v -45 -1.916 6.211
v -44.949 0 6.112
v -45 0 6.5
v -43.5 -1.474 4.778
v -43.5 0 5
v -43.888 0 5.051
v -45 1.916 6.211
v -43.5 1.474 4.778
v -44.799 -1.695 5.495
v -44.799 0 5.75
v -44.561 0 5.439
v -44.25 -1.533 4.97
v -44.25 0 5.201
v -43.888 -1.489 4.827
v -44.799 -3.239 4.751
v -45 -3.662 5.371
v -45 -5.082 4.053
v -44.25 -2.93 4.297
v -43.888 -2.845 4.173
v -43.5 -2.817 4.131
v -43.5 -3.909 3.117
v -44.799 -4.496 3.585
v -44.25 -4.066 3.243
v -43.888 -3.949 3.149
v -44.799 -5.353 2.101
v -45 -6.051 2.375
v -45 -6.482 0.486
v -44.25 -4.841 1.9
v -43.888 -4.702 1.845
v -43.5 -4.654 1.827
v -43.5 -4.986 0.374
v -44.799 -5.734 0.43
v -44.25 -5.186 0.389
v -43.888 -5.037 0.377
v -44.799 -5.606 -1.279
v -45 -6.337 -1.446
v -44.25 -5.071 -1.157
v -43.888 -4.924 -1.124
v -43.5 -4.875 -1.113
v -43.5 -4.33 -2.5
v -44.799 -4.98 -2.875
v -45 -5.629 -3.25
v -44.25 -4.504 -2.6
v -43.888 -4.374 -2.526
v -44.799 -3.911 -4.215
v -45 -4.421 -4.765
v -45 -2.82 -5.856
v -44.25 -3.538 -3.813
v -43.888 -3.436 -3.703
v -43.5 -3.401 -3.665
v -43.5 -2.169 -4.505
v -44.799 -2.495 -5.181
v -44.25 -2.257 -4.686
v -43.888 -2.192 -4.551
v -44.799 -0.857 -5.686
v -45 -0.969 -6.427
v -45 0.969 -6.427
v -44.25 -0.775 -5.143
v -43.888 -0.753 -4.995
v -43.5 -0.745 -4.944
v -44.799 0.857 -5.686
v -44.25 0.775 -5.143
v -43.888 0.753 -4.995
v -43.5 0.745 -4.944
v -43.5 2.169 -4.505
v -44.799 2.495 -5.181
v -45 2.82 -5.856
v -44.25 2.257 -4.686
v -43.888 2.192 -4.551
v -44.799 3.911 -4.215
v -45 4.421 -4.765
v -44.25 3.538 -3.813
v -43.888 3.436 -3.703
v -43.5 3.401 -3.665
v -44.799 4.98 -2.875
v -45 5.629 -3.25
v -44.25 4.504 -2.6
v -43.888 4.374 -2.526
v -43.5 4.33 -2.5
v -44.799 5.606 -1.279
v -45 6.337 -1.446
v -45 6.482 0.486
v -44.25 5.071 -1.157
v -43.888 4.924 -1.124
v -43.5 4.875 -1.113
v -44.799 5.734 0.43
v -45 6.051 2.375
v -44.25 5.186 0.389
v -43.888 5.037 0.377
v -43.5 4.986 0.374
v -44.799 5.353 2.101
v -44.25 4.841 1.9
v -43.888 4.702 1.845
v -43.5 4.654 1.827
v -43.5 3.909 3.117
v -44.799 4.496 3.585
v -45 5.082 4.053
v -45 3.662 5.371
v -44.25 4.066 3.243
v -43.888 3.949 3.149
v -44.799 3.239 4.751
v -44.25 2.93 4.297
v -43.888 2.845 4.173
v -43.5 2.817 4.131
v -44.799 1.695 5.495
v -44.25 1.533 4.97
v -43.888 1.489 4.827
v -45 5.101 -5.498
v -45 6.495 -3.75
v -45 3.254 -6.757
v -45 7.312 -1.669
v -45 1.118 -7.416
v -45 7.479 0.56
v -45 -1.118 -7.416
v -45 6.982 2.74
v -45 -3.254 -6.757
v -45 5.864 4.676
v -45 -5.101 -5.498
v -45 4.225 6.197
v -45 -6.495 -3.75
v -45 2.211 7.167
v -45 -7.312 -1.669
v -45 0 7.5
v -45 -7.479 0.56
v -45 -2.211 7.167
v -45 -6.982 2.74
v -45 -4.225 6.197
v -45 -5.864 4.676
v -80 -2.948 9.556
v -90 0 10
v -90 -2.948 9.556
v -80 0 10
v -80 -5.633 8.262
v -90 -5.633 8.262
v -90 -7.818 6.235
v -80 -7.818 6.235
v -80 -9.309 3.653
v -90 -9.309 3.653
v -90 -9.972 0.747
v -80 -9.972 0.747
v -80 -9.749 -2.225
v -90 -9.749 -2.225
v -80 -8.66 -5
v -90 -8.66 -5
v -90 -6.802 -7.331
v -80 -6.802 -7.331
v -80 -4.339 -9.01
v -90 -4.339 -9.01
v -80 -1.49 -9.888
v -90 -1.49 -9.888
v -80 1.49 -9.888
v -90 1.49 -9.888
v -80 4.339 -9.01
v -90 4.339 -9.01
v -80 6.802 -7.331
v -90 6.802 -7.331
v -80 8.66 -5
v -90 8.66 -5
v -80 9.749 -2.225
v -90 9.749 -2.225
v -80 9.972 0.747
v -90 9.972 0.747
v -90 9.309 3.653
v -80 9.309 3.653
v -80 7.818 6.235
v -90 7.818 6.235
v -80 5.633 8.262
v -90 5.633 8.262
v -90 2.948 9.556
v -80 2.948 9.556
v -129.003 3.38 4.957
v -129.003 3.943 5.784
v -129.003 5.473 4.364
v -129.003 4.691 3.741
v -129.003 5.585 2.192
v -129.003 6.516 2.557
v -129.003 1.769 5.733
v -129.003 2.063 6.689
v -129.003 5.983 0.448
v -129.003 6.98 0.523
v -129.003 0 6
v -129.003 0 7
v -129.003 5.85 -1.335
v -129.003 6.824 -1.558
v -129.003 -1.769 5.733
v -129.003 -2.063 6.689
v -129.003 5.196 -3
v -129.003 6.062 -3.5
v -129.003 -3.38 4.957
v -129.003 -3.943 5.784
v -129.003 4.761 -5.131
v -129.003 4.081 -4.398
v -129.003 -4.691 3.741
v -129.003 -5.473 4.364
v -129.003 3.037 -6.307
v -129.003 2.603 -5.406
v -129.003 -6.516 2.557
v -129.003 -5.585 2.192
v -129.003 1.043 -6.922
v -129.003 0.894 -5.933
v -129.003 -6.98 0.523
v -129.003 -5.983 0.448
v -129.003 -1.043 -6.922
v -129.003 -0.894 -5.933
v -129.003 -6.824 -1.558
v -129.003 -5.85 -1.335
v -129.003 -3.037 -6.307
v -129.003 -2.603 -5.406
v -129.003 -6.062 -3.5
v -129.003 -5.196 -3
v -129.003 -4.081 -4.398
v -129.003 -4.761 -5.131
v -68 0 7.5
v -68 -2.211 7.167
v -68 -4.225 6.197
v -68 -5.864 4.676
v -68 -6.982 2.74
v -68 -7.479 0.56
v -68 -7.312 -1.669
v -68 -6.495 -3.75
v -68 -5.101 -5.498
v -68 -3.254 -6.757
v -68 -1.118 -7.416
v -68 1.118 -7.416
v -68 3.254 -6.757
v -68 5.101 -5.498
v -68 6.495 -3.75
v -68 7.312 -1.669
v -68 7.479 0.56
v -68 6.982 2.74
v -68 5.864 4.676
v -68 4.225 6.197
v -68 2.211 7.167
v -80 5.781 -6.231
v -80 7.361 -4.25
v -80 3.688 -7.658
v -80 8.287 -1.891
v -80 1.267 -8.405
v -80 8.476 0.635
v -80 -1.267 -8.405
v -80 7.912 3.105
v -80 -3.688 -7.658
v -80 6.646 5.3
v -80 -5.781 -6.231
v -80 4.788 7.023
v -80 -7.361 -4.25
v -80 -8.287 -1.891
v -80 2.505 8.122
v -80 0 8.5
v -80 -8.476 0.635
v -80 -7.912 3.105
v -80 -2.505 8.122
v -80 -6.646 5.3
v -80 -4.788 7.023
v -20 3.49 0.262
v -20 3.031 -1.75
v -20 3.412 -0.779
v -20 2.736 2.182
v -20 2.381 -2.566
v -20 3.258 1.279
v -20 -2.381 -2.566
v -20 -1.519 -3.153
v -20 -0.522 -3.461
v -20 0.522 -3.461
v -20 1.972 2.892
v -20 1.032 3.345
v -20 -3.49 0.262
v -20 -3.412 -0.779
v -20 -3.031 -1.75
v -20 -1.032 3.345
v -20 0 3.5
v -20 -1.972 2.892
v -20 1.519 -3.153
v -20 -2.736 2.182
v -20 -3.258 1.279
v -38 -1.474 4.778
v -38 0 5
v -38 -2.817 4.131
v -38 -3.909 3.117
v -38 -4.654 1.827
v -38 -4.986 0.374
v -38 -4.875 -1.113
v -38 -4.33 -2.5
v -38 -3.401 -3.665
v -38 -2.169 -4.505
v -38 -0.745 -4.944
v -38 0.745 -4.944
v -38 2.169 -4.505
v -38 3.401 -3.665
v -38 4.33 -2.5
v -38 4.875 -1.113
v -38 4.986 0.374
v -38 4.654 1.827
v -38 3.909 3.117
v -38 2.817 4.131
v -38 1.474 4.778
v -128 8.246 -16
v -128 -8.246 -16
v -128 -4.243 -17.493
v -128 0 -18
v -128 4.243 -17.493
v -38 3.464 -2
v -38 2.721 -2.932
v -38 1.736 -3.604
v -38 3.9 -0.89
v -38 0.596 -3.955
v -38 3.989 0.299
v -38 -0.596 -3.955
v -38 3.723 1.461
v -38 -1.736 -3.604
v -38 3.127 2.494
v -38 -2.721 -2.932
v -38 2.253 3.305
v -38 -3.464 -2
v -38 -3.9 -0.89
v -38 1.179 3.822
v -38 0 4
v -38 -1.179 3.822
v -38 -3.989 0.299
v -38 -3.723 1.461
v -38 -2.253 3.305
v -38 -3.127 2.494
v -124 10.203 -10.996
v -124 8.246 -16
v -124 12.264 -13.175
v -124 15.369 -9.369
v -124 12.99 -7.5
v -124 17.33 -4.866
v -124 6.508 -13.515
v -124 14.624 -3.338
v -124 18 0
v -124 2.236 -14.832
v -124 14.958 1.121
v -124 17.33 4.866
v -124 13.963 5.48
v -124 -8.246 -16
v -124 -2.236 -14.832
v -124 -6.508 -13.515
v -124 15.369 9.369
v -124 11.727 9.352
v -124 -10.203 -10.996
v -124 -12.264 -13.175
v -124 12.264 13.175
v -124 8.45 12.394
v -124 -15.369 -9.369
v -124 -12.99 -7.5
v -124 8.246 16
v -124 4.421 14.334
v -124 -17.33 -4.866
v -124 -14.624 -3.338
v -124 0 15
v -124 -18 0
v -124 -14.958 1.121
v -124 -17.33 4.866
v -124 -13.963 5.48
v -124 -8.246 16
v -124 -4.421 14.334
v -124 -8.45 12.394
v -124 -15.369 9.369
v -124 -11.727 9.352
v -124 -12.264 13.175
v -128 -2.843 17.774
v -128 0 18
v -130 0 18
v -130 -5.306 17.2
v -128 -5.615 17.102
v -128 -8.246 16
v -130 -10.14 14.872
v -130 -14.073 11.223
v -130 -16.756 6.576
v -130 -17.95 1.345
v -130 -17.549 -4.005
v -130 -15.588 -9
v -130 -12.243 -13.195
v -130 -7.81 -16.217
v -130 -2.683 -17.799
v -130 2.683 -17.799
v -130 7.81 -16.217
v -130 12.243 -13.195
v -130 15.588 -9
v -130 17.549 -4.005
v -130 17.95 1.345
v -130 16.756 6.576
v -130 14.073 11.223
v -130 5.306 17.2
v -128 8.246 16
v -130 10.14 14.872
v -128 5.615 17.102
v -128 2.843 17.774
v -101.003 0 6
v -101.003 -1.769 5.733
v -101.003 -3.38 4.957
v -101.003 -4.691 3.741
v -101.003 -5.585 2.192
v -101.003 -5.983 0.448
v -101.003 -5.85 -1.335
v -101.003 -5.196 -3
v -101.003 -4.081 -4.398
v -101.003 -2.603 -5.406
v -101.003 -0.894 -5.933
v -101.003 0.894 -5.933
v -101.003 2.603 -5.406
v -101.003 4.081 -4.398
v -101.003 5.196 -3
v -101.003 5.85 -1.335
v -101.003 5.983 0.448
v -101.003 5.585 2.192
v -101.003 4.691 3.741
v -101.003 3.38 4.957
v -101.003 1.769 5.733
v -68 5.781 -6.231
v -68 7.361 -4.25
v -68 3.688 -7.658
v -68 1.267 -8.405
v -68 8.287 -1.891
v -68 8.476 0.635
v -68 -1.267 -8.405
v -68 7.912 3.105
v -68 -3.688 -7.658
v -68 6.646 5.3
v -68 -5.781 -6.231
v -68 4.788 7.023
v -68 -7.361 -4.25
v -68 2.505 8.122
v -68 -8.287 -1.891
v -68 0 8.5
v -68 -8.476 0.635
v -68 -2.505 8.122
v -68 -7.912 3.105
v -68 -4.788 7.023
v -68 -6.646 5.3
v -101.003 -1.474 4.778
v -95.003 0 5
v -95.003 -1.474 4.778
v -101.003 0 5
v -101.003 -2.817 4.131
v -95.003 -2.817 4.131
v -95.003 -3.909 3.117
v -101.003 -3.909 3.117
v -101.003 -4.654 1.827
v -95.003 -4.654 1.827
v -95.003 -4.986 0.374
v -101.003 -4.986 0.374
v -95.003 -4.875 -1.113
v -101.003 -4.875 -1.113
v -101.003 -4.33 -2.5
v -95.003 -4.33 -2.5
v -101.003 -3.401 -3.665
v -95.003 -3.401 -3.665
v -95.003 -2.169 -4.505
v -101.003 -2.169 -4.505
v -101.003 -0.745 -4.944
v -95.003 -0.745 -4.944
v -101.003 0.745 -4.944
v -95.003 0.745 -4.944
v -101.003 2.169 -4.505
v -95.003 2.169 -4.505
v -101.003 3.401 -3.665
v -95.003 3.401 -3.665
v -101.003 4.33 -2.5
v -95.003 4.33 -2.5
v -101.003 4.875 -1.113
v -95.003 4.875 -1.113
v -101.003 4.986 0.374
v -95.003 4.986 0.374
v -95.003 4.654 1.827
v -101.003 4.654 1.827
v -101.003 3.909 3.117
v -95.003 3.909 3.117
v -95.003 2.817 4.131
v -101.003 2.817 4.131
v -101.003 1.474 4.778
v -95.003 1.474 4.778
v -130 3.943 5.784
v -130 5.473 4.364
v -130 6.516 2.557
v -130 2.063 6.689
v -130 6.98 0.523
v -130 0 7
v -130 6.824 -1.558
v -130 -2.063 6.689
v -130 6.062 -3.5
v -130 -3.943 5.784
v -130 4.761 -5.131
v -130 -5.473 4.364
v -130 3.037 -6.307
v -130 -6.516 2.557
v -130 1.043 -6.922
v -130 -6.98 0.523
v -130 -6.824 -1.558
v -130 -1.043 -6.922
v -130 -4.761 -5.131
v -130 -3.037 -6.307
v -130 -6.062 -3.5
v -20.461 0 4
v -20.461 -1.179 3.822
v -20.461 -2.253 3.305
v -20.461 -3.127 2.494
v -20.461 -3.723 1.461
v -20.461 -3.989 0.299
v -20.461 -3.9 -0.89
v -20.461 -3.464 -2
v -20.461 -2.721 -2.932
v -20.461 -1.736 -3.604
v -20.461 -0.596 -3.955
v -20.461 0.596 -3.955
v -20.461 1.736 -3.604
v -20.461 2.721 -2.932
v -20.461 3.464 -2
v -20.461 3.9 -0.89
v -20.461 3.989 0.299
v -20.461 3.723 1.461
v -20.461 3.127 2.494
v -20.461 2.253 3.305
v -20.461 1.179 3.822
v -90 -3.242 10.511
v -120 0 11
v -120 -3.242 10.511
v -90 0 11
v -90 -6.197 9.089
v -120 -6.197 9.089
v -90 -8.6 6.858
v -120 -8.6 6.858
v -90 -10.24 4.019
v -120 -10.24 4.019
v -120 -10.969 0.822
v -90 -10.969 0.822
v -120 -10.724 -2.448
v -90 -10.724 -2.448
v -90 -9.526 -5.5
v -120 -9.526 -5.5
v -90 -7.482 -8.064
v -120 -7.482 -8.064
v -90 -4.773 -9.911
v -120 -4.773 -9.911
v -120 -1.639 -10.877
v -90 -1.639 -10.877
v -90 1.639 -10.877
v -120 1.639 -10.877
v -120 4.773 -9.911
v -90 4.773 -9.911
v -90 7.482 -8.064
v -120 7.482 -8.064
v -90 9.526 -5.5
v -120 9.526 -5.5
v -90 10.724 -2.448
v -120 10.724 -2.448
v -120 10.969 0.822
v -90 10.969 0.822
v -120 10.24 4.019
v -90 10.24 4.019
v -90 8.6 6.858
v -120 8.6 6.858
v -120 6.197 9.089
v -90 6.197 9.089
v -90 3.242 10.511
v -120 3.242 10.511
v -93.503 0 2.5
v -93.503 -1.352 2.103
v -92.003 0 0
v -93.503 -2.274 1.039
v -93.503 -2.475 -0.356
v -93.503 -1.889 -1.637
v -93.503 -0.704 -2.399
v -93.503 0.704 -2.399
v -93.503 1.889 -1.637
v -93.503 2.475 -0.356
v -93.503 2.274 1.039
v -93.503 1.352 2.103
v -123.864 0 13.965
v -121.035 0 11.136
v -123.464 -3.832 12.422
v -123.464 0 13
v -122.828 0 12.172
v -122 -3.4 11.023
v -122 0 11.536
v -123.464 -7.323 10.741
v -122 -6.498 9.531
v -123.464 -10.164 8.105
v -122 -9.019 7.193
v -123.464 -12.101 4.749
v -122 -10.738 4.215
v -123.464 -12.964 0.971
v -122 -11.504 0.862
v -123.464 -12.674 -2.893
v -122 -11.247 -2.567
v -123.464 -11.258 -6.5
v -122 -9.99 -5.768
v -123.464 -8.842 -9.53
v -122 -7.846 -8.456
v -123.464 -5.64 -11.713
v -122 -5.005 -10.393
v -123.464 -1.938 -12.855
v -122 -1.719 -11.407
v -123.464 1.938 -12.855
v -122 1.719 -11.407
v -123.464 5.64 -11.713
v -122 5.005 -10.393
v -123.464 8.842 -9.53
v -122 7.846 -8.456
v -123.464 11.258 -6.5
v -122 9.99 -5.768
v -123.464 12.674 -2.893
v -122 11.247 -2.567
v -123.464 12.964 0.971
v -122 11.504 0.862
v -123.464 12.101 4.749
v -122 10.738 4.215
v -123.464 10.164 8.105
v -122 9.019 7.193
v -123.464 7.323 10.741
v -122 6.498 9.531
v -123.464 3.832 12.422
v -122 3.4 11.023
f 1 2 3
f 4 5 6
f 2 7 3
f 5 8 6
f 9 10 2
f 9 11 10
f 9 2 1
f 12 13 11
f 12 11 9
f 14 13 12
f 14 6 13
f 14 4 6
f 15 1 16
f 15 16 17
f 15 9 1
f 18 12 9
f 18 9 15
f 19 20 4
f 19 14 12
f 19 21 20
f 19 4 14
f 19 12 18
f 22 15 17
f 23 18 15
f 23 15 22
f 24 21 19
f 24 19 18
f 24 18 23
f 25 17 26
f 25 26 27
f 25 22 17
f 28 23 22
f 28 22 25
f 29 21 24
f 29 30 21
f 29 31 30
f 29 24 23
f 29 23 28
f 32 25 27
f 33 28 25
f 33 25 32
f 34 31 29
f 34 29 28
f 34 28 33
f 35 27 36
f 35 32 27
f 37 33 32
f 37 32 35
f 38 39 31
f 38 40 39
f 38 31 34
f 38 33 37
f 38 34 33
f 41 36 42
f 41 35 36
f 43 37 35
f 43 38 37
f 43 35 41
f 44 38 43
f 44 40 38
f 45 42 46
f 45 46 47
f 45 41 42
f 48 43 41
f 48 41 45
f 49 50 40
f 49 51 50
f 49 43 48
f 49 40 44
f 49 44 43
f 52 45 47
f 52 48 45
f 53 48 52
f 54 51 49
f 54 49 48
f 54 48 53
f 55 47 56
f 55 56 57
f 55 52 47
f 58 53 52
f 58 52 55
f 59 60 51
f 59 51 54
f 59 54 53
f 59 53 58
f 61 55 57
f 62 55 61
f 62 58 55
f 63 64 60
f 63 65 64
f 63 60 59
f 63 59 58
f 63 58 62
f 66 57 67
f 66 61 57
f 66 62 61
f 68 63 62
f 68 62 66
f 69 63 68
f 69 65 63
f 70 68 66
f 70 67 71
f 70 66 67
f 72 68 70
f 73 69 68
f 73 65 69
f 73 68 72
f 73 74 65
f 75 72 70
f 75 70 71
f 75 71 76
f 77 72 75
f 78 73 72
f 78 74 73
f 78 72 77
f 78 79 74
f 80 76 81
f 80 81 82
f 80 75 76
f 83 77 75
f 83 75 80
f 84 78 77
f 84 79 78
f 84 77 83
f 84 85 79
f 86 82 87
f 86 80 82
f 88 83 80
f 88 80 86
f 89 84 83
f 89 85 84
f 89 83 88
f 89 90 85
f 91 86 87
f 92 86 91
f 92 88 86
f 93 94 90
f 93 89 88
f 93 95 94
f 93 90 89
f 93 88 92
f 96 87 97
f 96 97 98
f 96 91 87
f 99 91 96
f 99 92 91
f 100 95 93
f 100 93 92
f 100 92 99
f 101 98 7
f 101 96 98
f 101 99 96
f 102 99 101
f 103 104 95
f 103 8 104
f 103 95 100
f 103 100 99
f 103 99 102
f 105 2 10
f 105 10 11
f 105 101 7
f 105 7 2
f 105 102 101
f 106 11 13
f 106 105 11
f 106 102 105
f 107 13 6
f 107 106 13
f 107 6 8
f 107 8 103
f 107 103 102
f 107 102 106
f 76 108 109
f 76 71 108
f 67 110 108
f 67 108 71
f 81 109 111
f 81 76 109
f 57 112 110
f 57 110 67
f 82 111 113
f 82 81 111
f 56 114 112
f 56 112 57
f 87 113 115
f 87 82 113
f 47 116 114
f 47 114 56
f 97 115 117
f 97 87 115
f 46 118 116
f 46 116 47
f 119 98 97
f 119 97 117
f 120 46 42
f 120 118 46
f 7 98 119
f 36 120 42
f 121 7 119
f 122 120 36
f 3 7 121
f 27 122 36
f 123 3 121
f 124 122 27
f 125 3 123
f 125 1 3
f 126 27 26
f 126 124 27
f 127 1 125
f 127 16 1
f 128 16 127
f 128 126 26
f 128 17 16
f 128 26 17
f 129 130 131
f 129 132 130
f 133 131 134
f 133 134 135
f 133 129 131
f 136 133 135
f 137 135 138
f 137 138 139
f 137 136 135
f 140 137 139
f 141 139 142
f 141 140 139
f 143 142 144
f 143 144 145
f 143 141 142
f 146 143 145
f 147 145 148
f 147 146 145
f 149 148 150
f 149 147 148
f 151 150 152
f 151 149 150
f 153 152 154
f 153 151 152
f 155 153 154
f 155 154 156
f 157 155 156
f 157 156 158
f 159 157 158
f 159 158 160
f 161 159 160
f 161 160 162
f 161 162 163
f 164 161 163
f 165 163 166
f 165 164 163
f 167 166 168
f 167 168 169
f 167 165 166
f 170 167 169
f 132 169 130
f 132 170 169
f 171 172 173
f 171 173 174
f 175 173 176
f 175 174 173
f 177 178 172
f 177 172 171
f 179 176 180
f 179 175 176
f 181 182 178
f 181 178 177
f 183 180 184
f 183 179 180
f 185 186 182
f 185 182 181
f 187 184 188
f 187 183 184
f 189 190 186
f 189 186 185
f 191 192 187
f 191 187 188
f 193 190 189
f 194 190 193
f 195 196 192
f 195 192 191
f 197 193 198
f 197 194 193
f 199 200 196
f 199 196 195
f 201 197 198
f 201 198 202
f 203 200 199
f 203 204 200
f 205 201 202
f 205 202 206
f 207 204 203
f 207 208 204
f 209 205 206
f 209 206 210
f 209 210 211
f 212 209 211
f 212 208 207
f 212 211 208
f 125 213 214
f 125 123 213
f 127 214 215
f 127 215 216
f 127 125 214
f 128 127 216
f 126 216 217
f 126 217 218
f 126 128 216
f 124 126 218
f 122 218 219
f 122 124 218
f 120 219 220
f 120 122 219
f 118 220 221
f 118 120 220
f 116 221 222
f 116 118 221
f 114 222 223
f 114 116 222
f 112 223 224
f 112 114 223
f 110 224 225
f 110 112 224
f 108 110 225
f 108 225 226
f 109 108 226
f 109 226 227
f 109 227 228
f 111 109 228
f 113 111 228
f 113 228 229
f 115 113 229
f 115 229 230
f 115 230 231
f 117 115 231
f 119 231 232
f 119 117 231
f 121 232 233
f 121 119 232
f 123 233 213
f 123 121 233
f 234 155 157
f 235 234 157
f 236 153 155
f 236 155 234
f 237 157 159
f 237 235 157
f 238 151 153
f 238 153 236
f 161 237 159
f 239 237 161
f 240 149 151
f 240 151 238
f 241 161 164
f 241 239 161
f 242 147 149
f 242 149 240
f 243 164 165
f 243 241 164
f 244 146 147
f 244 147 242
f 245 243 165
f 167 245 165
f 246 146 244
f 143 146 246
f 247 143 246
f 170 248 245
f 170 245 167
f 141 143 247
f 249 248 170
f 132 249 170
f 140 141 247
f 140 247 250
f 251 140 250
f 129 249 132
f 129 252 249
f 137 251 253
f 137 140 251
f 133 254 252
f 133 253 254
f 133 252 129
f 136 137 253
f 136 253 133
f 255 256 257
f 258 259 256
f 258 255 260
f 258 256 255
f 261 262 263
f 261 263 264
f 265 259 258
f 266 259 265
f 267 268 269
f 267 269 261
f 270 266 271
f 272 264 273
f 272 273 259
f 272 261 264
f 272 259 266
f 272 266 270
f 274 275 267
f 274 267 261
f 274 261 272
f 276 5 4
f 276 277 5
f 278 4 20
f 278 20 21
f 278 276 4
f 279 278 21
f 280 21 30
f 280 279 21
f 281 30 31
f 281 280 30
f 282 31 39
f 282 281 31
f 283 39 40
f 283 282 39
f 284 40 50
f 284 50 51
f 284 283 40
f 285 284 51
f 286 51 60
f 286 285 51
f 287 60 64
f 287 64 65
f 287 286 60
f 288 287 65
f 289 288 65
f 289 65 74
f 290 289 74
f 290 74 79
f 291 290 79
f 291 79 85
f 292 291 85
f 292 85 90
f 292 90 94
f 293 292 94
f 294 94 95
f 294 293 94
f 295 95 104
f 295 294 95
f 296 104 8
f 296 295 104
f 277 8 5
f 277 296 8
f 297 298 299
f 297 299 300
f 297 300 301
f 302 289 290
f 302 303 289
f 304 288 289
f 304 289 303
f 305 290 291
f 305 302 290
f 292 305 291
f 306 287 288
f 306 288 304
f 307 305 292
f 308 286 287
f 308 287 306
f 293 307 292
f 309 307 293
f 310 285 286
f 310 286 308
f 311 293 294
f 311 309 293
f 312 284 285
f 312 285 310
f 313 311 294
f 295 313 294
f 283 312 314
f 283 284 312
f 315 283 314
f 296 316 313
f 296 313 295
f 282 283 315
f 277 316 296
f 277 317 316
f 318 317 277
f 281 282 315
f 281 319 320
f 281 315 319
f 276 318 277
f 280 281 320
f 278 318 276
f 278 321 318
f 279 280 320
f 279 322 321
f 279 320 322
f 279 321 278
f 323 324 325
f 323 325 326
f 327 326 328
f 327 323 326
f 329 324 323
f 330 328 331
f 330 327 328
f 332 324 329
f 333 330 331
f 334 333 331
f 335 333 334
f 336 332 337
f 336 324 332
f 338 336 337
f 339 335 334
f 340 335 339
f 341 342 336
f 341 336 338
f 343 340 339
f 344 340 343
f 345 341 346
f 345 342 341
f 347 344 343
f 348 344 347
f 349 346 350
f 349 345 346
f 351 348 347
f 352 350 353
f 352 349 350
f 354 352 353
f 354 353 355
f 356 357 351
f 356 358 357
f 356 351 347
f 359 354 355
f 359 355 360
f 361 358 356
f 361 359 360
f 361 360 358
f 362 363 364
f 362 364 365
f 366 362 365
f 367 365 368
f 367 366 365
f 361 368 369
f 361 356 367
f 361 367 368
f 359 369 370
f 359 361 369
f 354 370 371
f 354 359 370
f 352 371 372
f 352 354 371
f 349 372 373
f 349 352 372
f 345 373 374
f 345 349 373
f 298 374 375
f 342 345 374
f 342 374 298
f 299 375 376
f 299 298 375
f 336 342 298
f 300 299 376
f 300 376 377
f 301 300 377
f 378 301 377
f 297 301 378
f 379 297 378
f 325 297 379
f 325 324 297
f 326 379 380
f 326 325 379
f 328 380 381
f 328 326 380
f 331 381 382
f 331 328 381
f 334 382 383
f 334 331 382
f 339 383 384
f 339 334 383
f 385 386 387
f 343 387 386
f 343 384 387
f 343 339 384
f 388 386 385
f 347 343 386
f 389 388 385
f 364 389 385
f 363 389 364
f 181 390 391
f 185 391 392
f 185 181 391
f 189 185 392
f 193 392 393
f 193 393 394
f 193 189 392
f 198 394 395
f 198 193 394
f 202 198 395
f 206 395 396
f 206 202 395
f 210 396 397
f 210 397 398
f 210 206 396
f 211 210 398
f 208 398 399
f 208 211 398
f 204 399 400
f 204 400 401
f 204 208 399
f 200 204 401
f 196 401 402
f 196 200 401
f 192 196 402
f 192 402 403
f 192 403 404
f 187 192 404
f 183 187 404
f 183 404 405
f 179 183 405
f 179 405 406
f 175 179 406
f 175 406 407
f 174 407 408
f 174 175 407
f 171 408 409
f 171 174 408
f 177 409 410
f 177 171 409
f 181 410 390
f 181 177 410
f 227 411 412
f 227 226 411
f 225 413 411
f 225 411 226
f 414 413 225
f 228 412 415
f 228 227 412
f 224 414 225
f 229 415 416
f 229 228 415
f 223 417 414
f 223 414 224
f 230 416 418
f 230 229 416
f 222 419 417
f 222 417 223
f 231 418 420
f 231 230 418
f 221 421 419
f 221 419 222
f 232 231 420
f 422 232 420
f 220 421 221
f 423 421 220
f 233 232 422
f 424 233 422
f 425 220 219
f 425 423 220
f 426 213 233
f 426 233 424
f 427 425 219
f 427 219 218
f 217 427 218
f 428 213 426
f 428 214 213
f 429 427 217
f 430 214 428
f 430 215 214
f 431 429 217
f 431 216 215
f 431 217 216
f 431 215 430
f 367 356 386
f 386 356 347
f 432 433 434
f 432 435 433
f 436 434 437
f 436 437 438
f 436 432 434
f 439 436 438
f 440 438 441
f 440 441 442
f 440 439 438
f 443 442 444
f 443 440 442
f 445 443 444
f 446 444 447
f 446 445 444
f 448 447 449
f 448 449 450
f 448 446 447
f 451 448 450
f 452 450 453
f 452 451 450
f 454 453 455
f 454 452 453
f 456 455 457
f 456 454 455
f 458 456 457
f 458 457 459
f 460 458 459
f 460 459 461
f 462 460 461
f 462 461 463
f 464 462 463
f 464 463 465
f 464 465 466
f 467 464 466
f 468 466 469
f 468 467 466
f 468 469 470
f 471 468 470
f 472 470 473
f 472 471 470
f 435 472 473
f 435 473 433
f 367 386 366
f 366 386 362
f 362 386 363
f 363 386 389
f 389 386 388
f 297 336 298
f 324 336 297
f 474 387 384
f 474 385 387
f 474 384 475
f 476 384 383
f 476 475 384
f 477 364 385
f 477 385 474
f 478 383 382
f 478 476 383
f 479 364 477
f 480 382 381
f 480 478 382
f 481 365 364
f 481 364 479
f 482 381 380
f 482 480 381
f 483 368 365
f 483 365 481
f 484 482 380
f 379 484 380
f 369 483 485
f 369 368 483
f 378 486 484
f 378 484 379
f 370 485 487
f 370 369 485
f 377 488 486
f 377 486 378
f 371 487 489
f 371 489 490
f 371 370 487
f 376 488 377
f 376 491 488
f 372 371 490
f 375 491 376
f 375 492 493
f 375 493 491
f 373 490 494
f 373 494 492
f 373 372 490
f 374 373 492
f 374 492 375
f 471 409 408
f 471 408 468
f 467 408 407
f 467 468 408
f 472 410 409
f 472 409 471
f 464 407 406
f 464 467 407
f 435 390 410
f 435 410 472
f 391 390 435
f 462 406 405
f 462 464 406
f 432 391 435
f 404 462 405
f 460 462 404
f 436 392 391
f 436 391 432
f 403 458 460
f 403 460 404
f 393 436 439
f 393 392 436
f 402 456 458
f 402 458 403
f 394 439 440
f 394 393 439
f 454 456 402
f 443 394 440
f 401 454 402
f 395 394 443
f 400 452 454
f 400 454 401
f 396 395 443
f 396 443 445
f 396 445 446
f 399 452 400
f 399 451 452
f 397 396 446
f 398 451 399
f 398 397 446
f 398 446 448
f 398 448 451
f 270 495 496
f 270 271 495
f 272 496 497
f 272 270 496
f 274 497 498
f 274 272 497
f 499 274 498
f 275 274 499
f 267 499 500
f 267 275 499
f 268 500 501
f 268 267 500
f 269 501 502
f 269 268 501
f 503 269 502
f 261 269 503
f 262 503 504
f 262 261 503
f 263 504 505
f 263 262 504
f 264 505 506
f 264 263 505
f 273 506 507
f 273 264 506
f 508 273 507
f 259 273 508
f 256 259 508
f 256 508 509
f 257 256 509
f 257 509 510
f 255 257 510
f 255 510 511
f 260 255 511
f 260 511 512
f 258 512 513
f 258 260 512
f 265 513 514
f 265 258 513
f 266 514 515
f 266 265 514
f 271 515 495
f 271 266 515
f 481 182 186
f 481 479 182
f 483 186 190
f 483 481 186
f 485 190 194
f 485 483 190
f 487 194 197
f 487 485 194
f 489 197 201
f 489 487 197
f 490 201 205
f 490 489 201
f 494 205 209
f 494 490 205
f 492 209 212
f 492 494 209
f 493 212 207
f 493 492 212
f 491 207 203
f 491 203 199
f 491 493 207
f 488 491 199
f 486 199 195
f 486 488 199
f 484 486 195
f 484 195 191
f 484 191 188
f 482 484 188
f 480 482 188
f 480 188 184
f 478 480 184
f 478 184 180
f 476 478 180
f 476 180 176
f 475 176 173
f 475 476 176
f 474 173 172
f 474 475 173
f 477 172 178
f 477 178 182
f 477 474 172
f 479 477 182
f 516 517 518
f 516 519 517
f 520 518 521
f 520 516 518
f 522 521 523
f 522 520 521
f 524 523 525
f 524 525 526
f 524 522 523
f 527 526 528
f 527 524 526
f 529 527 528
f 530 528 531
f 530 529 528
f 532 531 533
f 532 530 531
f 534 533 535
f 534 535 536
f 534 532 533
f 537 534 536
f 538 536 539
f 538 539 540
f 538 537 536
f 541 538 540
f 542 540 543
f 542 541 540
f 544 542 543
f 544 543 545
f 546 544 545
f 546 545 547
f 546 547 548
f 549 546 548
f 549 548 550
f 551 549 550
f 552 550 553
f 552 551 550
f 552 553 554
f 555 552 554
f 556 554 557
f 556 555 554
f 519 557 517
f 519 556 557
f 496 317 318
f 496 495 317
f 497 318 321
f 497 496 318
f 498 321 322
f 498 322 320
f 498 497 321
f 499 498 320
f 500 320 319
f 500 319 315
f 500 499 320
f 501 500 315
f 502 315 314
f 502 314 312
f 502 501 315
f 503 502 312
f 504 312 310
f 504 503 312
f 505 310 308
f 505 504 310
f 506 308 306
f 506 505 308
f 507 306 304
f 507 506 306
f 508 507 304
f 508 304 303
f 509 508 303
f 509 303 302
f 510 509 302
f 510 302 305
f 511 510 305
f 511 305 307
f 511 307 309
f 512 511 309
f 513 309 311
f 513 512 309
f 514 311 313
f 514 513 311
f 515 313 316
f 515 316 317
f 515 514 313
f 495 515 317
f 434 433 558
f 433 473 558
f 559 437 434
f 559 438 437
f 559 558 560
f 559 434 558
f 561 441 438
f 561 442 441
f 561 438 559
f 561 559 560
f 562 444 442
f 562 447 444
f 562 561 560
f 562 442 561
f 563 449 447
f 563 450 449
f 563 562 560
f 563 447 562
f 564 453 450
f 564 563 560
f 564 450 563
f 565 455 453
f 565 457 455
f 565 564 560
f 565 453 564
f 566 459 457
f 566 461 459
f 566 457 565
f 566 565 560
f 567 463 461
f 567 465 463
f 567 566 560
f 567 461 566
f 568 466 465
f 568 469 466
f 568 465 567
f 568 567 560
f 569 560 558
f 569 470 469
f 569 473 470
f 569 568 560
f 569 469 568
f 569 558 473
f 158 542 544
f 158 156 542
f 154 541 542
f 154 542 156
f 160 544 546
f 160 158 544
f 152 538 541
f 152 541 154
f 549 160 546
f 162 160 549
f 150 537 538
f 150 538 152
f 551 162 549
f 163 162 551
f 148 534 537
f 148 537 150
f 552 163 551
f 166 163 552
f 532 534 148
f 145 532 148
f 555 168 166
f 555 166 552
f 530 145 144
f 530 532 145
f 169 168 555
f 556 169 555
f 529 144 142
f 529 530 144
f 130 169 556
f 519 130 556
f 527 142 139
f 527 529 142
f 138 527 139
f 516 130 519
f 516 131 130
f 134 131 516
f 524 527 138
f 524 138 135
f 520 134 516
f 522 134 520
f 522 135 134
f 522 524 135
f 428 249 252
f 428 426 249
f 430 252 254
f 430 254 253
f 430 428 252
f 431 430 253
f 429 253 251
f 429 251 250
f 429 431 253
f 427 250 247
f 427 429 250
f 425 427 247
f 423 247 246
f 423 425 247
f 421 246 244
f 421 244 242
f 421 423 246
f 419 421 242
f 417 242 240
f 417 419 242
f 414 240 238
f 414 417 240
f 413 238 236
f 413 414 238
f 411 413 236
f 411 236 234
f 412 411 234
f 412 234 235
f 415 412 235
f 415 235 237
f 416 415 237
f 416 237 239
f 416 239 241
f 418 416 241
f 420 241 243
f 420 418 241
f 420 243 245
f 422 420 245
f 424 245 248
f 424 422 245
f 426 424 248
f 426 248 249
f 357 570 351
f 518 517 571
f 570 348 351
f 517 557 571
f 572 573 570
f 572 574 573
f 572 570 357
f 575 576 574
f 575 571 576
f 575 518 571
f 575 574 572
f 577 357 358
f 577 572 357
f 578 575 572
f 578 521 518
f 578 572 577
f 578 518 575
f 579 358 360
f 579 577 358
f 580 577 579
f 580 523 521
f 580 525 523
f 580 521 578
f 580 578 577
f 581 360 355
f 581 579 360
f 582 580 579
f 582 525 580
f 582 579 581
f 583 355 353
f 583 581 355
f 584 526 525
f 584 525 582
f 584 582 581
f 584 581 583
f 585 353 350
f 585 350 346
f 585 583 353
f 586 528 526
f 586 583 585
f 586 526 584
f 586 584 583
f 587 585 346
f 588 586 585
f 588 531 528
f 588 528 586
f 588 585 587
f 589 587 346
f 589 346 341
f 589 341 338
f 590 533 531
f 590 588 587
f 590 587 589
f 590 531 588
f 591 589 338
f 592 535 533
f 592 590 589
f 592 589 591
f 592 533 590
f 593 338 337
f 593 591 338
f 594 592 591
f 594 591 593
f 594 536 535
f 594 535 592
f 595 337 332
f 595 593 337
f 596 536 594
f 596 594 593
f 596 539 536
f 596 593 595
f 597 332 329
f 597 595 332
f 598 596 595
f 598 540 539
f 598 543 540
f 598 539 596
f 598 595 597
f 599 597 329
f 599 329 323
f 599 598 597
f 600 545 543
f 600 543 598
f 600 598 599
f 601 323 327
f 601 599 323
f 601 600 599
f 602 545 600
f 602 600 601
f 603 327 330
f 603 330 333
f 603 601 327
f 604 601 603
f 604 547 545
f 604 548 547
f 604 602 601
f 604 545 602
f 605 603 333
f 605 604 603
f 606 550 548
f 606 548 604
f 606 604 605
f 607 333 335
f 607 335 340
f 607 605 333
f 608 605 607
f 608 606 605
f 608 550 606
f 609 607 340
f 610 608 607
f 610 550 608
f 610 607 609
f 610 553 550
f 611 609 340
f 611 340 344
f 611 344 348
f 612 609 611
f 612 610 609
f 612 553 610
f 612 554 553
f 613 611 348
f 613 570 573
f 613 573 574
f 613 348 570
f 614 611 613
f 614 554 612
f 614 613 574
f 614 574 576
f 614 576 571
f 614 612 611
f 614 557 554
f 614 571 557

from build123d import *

# Parameters (mm, degrees)
ESQUISSE3_W             = 4
ESQUISSE3_H             = 20
ENL_V_MAT_EXTRU_1_DEPTH = 4


with BuildPart() as part:
    # Esquisse1 → Base-Révolution (revolve)
    with BuildSketch(Plane.XY, mode=Mode.PRIVATE) as base_r_volution_sk:
        with BuildLine():
            Line((-130, 7), (-130, 18))
            Line((-130, 18), (-124, 18))
            Line((-124, 18), (-124, 15))
            ThreePointArc((-124, 15), (-122.828427125, 12.171572875), (-120, 11))
            Line((-120, 11), (-90, 11))
            Line((-90, 11), (-90, 10))
            Line((-90, 10), (-80, 10))
            Line((-80, 10), (-80, 8.5))
            Line((-80, 8.5), (-68, 8.5))
            Line((-68, 8.5), (-68, 7.5))
            Line((-68, 7.5), (-45, 7.5))
            Line((-45, 7.5), (-45, 6.5))
            ThreePointArc((-45, 6.5), (-44.560660172, 5.439339828), (-43.5, 5))
            Line((-43.5, 5), (-38, 5))
            Line((-38, 5), (-38, 4))
            Line((-38, 4), (-20.461275116, 4))
            Line((-20.461275116, 4), (-20, 3.5))
            Line((-20, 3.5), (-20, 0))
            Line((-20, 0), (-92.003246889, 0))
            Line((-92.003246889, 0), (-95.003246889, 5))
            Line((-95.003246889, 5), (-101.003246889, 5))
            Line((-101.003246889, 5), (-101.003246889, 6))
            Line((-101.003246889, 6), (-129.003246889, 6))
            Line((-129.003246889, 6), (-129.003246889, 7))
            Line((-129.003246889, 7), (-130, 7))
        make_face()
    revolve(base_r_volution_sk.sketch.rotate(Axis((-125, 0, 0), (1, 0, 0)), 90), axis=Axis((-125, 0, 0), (1, 0, 0)))

    # Esquisse3 → Enlèv. mat.-Extru.1 (cut)
    with BuildSketch(Plane(origin=(-124, 0, 0), x_dir=(0, 0, -1), z_dir=(1, 0, 0))):
        with Locations((-18, 0)):
            Rectangle(ESQUISSE3_W, ESQUISSE3_H)
        with Locations((18, 0)):
            Rectangle(ESQUISSE3_W, ESQUISSE3_H)
    extrude(amount=-ENL_V_MAT_EXTRU_1_DEPTH, mode=Mode.SUBTRACT)


solid = part.part
